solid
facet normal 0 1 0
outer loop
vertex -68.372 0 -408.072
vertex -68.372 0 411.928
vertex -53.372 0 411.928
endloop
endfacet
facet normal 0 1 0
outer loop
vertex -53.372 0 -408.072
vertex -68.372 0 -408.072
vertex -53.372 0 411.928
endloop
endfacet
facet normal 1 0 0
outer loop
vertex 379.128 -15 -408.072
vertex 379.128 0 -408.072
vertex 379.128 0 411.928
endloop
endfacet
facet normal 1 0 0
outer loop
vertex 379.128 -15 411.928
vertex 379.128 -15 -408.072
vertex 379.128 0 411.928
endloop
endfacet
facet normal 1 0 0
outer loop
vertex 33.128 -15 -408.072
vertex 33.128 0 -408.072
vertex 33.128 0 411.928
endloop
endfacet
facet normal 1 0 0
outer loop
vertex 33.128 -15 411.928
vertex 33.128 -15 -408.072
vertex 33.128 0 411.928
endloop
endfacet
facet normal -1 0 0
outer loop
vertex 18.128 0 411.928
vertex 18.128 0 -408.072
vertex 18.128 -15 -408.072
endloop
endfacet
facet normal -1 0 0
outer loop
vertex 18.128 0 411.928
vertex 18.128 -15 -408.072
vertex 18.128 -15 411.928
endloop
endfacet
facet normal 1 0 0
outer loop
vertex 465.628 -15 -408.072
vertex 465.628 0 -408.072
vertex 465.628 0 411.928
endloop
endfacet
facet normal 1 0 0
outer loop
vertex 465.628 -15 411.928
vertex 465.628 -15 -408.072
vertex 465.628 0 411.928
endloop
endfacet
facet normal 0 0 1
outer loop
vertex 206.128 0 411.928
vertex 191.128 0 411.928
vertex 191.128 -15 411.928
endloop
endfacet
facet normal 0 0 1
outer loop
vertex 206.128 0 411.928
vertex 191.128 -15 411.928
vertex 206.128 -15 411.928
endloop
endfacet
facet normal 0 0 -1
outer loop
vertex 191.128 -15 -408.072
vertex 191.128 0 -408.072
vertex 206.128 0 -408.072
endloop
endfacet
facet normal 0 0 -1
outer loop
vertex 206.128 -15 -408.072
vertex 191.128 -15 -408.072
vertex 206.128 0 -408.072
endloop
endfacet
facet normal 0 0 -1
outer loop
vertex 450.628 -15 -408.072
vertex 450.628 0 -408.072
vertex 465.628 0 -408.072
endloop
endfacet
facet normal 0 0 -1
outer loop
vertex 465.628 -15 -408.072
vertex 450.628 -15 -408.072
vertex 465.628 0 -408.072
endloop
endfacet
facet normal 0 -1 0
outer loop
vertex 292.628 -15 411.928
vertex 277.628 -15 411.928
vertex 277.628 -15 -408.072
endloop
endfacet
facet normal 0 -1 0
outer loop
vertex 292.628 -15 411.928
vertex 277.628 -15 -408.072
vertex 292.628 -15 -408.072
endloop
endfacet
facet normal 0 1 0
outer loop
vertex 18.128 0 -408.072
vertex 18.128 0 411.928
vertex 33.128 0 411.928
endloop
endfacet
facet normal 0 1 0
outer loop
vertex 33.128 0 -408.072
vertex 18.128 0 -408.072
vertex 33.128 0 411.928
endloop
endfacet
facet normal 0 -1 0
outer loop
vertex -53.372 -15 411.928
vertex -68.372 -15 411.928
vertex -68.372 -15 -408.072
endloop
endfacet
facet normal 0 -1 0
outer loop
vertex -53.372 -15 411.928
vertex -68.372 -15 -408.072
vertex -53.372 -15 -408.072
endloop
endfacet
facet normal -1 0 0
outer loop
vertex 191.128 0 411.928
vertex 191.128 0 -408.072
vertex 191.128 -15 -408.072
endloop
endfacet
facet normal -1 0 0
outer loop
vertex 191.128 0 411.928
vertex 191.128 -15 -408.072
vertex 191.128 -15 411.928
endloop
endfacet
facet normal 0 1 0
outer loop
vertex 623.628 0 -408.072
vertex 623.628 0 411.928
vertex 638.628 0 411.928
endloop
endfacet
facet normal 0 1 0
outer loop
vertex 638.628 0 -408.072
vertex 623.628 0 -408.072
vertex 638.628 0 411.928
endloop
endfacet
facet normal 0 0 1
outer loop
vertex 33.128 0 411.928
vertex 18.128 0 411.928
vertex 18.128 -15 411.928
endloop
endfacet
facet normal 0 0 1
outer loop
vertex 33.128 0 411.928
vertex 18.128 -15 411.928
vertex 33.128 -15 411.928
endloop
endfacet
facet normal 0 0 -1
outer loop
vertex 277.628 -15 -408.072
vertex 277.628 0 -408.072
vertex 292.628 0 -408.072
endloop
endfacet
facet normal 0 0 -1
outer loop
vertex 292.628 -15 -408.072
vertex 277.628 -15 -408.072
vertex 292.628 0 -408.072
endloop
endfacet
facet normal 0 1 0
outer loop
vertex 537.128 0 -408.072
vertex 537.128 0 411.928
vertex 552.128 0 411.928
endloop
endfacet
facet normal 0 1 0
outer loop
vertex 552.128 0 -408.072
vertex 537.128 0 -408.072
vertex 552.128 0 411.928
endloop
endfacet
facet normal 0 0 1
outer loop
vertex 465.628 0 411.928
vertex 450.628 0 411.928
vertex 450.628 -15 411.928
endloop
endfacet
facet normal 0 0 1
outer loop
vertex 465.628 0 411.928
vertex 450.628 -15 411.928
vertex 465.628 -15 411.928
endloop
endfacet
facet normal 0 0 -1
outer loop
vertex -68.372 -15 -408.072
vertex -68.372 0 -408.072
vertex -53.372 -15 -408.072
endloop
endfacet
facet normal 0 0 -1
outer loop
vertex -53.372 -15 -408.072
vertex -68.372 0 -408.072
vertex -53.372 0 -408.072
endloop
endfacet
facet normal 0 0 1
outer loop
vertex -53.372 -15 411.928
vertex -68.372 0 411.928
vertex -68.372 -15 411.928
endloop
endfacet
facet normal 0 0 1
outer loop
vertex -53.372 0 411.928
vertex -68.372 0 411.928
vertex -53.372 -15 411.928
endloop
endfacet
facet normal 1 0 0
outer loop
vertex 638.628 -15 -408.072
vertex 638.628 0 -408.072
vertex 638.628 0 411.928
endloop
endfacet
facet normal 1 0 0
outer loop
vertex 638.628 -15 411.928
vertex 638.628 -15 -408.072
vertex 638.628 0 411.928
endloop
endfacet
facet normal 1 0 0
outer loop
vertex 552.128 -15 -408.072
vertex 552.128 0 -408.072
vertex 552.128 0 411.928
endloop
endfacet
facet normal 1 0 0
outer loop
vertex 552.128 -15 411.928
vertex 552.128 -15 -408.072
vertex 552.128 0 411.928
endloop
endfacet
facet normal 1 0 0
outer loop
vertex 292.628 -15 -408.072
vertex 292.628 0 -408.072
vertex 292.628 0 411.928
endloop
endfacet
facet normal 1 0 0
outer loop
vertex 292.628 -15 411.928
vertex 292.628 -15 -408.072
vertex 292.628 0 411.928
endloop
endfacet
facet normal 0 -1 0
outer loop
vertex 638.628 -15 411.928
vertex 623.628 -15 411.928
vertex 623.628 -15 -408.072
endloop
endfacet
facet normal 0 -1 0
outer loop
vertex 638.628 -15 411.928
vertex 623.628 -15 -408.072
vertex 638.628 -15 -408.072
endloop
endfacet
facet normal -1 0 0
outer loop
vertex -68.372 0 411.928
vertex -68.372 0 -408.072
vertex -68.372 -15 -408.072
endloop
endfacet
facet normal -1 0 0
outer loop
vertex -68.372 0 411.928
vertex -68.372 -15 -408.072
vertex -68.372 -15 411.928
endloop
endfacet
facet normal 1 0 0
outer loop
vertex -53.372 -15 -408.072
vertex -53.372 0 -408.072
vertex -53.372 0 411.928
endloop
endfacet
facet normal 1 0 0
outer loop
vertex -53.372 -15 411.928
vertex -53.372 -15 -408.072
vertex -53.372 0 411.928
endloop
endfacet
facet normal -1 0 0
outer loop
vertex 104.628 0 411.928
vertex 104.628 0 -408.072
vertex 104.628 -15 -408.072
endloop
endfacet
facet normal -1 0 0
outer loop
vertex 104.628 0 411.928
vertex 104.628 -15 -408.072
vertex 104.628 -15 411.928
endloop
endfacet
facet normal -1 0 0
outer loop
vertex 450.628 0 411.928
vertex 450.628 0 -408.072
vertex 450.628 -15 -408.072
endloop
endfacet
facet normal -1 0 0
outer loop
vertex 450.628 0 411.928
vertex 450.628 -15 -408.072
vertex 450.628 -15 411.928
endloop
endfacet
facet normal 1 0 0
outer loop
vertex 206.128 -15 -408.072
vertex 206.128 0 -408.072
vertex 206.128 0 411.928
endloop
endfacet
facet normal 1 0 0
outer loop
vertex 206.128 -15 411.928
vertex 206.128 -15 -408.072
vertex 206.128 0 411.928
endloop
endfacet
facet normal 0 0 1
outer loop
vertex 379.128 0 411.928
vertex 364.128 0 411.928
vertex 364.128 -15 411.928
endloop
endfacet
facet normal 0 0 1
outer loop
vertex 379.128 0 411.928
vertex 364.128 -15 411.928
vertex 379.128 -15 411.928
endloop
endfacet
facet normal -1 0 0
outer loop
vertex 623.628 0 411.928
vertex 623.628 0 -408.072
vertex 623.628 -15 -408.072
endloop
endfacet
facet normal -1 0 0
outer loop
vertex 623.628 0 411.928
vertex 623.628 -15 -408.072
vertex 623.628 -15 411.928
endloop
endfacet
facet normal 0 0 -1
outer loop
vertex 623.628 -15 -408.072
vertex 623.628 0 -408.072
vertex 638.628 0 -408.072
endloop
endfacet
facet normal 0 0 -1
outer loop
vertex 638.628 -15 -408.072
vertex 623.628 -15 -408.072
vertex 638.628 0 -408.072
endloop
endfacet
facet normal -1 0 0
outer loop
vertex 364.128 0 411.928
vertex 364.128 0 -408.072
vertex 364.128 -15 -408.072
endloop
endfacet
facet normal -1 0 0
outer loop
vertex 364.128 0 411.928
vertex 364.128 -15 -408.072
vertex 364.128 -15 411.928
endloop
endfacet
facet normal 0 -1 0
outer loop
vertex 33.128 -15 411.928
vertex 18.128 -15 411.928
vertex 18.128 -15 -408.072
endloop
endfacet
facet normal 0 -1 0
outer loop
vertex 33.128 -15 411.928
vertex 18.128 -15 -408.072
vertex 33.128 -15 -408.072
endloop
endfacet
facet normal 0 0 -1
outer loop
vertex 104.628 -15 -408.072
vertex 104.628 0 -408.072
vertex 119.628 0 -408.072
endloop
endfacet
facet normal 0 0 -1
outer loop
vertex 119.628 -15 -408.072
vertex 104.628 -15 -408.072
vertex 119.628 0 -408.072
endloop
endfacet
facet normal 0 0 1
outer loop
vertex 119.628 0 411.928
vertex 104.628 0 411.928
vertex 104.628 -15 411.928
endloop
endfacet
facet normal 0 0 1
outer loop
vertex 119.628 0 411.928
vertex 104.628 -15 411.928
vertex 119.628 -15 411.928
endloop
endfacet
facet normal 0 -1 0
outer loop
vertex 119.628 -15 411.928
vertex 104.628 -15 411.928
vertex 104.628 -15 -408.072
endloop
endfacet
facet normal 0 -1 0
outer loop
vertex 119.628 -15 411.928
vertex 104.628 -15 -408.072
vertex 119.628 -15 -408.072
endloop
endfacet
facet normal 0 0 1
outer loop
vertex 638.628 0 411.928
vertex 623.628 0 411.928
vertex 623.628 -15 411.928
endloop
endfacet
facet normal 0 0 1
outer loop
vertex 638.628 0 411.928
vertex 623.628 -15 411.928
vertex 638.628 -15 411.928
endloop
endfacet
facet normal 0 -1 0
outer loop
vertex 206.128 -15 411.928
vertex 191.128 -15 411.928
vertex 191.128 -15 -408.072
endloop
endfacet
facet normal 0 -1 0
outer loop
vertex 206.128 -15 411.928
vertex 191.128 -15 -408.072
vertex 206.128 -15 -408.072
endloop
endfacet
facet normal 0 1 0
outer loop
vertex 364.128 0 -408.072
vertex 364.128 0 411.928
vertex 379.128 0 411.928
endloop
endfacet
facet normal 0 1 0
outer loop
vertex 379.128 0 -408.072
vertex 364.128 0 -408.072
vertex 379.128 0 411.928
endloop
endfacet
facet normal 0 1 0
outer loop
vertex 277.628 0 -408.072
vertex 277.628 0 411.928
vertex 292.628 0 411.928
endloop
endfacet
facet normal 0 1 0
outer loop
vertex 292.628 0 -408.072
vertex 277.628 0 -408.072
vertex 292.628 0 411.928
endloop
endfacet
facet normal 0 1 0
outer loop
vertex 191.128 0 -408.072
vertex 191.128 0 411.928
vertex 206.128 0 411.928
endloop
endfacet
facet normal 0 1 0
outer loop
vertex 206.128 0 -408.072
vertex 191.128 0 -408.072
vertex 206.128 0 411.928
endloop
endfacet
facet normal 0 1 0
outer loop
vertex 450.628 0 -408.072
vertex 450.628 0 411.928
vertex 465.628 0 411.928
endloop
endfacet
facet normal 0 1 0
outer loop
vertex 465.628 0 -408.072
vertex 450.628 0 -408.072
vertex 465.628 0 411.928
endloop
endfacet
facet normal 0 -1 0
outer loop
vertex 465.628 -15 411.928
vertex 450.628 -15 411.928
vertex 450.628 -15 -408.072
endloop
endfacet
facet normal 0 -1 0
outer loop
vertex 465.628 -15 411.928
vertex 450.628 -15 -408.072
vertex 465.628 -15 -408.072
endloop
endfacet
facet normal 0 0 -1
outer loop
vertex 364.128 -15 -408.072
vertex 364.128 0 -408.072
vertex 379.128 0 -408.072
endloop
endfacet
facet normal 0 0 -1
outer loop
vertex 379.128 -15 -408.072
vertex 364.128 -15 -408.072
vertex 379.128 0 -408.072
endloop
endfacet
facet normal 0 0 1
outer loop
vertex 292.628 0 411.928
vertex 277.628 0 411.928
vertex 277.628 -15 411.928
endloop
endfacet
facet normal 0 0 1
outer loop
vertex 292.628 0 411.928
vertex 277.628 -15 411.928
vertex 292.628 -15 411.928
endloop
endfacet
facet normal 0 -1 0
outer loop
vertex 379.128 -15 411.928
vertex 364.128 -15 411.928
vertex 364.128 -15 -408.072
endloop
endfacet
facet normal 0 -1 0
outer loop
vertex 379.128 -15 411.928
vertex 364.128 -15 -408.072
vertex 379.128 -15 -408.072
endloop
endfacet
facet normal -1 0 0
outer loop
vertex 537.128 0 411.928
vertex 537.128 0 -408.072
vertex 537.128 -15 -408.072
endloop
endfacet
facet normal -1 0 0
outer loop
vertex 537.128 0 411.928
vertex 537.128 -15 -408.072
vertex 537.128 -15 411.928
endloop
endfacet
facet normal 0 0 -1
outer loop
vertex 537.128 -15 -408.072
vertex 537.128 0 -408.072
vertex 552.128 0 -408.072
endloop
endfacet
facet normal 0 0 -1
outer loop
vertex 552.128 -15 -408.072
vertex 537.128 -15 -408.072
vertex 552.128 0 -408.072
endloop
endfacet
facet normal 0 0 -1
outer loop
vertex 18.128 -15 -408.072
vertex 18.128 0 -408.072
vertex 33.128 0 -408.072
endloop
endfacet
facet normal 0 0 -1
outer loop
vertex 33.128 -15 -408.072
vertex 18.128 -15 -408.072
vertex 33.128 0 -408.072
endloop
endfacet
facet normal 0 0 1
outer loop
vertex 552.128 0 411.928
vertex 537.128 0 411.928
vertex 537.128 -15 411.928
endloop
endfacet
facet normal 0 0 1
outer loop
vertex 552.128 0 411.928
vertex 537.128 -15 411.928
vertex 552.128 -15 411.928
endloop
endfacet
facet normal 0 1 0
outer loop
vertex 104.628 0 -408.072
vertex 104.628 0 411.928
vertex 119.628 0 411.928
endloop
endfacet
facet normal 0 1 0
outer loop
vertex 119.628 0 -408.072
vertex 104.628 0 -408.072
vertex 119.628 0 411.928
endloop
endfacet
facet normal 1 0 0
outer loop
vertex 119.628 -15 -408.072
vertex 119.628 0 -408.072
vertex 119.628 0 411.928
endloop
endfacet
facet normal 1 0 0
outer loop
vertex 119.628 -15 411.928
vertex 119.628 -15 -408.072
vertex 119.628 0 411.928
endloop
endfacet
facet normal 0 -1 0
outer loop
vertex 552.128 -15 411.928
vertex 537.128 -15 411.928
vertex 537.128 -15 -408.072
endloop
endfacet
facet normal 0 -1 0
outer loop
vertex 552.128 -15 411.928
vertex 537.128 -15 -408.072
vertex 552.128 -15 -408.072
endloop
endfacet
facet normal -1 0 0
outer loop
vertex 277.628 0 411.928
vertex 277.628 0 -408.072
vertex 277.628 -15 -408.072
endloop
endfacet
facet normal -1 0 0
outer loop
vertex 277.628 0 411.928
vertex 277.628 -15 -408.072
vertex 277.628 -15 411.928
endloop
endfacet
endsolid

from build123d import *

# Parameters (mm, degrees)
F0_W     = 15
F0_H     = 820
F1_DEPTH = 15


with BuildPart() as f1:
    # F0 (on Front) → F1 (new body)
    with BuildSketch(Plane.XZ):
        with Locations((-60.871643, 1.92824)):
            Rectangle(F0_W, F0_H)
        with Locations((25.628357, 1.92824)):
            Rectangle(F0_W, F0_H)
        with Locations((112.128357, 1.92824)):
            Rectangle(F0_W, F0_H)
        with Locations((198.628357, 1.92824)):
            Rectangle(F0_W, F0_H)
        with Locations((285.128357, 1.92824)):
            Rectangle(F0_W, F0_H)
        with Locations((371.628357, 1.92824)):
            Rectangle(F0_W, F0_H)
        with Locations((458.128357, 1.92824)):
            Rectangle(F0_W, F0_H)
        with Locations((544.628357, 1.92824)):
            Rectangle(F0_W, F0_H)
        with Locations((631.128357, 1.92824)):
            Rectangle(F0_W, F0_H)
    extrude(amount=F1_DEPTH)


solid = f1.part
